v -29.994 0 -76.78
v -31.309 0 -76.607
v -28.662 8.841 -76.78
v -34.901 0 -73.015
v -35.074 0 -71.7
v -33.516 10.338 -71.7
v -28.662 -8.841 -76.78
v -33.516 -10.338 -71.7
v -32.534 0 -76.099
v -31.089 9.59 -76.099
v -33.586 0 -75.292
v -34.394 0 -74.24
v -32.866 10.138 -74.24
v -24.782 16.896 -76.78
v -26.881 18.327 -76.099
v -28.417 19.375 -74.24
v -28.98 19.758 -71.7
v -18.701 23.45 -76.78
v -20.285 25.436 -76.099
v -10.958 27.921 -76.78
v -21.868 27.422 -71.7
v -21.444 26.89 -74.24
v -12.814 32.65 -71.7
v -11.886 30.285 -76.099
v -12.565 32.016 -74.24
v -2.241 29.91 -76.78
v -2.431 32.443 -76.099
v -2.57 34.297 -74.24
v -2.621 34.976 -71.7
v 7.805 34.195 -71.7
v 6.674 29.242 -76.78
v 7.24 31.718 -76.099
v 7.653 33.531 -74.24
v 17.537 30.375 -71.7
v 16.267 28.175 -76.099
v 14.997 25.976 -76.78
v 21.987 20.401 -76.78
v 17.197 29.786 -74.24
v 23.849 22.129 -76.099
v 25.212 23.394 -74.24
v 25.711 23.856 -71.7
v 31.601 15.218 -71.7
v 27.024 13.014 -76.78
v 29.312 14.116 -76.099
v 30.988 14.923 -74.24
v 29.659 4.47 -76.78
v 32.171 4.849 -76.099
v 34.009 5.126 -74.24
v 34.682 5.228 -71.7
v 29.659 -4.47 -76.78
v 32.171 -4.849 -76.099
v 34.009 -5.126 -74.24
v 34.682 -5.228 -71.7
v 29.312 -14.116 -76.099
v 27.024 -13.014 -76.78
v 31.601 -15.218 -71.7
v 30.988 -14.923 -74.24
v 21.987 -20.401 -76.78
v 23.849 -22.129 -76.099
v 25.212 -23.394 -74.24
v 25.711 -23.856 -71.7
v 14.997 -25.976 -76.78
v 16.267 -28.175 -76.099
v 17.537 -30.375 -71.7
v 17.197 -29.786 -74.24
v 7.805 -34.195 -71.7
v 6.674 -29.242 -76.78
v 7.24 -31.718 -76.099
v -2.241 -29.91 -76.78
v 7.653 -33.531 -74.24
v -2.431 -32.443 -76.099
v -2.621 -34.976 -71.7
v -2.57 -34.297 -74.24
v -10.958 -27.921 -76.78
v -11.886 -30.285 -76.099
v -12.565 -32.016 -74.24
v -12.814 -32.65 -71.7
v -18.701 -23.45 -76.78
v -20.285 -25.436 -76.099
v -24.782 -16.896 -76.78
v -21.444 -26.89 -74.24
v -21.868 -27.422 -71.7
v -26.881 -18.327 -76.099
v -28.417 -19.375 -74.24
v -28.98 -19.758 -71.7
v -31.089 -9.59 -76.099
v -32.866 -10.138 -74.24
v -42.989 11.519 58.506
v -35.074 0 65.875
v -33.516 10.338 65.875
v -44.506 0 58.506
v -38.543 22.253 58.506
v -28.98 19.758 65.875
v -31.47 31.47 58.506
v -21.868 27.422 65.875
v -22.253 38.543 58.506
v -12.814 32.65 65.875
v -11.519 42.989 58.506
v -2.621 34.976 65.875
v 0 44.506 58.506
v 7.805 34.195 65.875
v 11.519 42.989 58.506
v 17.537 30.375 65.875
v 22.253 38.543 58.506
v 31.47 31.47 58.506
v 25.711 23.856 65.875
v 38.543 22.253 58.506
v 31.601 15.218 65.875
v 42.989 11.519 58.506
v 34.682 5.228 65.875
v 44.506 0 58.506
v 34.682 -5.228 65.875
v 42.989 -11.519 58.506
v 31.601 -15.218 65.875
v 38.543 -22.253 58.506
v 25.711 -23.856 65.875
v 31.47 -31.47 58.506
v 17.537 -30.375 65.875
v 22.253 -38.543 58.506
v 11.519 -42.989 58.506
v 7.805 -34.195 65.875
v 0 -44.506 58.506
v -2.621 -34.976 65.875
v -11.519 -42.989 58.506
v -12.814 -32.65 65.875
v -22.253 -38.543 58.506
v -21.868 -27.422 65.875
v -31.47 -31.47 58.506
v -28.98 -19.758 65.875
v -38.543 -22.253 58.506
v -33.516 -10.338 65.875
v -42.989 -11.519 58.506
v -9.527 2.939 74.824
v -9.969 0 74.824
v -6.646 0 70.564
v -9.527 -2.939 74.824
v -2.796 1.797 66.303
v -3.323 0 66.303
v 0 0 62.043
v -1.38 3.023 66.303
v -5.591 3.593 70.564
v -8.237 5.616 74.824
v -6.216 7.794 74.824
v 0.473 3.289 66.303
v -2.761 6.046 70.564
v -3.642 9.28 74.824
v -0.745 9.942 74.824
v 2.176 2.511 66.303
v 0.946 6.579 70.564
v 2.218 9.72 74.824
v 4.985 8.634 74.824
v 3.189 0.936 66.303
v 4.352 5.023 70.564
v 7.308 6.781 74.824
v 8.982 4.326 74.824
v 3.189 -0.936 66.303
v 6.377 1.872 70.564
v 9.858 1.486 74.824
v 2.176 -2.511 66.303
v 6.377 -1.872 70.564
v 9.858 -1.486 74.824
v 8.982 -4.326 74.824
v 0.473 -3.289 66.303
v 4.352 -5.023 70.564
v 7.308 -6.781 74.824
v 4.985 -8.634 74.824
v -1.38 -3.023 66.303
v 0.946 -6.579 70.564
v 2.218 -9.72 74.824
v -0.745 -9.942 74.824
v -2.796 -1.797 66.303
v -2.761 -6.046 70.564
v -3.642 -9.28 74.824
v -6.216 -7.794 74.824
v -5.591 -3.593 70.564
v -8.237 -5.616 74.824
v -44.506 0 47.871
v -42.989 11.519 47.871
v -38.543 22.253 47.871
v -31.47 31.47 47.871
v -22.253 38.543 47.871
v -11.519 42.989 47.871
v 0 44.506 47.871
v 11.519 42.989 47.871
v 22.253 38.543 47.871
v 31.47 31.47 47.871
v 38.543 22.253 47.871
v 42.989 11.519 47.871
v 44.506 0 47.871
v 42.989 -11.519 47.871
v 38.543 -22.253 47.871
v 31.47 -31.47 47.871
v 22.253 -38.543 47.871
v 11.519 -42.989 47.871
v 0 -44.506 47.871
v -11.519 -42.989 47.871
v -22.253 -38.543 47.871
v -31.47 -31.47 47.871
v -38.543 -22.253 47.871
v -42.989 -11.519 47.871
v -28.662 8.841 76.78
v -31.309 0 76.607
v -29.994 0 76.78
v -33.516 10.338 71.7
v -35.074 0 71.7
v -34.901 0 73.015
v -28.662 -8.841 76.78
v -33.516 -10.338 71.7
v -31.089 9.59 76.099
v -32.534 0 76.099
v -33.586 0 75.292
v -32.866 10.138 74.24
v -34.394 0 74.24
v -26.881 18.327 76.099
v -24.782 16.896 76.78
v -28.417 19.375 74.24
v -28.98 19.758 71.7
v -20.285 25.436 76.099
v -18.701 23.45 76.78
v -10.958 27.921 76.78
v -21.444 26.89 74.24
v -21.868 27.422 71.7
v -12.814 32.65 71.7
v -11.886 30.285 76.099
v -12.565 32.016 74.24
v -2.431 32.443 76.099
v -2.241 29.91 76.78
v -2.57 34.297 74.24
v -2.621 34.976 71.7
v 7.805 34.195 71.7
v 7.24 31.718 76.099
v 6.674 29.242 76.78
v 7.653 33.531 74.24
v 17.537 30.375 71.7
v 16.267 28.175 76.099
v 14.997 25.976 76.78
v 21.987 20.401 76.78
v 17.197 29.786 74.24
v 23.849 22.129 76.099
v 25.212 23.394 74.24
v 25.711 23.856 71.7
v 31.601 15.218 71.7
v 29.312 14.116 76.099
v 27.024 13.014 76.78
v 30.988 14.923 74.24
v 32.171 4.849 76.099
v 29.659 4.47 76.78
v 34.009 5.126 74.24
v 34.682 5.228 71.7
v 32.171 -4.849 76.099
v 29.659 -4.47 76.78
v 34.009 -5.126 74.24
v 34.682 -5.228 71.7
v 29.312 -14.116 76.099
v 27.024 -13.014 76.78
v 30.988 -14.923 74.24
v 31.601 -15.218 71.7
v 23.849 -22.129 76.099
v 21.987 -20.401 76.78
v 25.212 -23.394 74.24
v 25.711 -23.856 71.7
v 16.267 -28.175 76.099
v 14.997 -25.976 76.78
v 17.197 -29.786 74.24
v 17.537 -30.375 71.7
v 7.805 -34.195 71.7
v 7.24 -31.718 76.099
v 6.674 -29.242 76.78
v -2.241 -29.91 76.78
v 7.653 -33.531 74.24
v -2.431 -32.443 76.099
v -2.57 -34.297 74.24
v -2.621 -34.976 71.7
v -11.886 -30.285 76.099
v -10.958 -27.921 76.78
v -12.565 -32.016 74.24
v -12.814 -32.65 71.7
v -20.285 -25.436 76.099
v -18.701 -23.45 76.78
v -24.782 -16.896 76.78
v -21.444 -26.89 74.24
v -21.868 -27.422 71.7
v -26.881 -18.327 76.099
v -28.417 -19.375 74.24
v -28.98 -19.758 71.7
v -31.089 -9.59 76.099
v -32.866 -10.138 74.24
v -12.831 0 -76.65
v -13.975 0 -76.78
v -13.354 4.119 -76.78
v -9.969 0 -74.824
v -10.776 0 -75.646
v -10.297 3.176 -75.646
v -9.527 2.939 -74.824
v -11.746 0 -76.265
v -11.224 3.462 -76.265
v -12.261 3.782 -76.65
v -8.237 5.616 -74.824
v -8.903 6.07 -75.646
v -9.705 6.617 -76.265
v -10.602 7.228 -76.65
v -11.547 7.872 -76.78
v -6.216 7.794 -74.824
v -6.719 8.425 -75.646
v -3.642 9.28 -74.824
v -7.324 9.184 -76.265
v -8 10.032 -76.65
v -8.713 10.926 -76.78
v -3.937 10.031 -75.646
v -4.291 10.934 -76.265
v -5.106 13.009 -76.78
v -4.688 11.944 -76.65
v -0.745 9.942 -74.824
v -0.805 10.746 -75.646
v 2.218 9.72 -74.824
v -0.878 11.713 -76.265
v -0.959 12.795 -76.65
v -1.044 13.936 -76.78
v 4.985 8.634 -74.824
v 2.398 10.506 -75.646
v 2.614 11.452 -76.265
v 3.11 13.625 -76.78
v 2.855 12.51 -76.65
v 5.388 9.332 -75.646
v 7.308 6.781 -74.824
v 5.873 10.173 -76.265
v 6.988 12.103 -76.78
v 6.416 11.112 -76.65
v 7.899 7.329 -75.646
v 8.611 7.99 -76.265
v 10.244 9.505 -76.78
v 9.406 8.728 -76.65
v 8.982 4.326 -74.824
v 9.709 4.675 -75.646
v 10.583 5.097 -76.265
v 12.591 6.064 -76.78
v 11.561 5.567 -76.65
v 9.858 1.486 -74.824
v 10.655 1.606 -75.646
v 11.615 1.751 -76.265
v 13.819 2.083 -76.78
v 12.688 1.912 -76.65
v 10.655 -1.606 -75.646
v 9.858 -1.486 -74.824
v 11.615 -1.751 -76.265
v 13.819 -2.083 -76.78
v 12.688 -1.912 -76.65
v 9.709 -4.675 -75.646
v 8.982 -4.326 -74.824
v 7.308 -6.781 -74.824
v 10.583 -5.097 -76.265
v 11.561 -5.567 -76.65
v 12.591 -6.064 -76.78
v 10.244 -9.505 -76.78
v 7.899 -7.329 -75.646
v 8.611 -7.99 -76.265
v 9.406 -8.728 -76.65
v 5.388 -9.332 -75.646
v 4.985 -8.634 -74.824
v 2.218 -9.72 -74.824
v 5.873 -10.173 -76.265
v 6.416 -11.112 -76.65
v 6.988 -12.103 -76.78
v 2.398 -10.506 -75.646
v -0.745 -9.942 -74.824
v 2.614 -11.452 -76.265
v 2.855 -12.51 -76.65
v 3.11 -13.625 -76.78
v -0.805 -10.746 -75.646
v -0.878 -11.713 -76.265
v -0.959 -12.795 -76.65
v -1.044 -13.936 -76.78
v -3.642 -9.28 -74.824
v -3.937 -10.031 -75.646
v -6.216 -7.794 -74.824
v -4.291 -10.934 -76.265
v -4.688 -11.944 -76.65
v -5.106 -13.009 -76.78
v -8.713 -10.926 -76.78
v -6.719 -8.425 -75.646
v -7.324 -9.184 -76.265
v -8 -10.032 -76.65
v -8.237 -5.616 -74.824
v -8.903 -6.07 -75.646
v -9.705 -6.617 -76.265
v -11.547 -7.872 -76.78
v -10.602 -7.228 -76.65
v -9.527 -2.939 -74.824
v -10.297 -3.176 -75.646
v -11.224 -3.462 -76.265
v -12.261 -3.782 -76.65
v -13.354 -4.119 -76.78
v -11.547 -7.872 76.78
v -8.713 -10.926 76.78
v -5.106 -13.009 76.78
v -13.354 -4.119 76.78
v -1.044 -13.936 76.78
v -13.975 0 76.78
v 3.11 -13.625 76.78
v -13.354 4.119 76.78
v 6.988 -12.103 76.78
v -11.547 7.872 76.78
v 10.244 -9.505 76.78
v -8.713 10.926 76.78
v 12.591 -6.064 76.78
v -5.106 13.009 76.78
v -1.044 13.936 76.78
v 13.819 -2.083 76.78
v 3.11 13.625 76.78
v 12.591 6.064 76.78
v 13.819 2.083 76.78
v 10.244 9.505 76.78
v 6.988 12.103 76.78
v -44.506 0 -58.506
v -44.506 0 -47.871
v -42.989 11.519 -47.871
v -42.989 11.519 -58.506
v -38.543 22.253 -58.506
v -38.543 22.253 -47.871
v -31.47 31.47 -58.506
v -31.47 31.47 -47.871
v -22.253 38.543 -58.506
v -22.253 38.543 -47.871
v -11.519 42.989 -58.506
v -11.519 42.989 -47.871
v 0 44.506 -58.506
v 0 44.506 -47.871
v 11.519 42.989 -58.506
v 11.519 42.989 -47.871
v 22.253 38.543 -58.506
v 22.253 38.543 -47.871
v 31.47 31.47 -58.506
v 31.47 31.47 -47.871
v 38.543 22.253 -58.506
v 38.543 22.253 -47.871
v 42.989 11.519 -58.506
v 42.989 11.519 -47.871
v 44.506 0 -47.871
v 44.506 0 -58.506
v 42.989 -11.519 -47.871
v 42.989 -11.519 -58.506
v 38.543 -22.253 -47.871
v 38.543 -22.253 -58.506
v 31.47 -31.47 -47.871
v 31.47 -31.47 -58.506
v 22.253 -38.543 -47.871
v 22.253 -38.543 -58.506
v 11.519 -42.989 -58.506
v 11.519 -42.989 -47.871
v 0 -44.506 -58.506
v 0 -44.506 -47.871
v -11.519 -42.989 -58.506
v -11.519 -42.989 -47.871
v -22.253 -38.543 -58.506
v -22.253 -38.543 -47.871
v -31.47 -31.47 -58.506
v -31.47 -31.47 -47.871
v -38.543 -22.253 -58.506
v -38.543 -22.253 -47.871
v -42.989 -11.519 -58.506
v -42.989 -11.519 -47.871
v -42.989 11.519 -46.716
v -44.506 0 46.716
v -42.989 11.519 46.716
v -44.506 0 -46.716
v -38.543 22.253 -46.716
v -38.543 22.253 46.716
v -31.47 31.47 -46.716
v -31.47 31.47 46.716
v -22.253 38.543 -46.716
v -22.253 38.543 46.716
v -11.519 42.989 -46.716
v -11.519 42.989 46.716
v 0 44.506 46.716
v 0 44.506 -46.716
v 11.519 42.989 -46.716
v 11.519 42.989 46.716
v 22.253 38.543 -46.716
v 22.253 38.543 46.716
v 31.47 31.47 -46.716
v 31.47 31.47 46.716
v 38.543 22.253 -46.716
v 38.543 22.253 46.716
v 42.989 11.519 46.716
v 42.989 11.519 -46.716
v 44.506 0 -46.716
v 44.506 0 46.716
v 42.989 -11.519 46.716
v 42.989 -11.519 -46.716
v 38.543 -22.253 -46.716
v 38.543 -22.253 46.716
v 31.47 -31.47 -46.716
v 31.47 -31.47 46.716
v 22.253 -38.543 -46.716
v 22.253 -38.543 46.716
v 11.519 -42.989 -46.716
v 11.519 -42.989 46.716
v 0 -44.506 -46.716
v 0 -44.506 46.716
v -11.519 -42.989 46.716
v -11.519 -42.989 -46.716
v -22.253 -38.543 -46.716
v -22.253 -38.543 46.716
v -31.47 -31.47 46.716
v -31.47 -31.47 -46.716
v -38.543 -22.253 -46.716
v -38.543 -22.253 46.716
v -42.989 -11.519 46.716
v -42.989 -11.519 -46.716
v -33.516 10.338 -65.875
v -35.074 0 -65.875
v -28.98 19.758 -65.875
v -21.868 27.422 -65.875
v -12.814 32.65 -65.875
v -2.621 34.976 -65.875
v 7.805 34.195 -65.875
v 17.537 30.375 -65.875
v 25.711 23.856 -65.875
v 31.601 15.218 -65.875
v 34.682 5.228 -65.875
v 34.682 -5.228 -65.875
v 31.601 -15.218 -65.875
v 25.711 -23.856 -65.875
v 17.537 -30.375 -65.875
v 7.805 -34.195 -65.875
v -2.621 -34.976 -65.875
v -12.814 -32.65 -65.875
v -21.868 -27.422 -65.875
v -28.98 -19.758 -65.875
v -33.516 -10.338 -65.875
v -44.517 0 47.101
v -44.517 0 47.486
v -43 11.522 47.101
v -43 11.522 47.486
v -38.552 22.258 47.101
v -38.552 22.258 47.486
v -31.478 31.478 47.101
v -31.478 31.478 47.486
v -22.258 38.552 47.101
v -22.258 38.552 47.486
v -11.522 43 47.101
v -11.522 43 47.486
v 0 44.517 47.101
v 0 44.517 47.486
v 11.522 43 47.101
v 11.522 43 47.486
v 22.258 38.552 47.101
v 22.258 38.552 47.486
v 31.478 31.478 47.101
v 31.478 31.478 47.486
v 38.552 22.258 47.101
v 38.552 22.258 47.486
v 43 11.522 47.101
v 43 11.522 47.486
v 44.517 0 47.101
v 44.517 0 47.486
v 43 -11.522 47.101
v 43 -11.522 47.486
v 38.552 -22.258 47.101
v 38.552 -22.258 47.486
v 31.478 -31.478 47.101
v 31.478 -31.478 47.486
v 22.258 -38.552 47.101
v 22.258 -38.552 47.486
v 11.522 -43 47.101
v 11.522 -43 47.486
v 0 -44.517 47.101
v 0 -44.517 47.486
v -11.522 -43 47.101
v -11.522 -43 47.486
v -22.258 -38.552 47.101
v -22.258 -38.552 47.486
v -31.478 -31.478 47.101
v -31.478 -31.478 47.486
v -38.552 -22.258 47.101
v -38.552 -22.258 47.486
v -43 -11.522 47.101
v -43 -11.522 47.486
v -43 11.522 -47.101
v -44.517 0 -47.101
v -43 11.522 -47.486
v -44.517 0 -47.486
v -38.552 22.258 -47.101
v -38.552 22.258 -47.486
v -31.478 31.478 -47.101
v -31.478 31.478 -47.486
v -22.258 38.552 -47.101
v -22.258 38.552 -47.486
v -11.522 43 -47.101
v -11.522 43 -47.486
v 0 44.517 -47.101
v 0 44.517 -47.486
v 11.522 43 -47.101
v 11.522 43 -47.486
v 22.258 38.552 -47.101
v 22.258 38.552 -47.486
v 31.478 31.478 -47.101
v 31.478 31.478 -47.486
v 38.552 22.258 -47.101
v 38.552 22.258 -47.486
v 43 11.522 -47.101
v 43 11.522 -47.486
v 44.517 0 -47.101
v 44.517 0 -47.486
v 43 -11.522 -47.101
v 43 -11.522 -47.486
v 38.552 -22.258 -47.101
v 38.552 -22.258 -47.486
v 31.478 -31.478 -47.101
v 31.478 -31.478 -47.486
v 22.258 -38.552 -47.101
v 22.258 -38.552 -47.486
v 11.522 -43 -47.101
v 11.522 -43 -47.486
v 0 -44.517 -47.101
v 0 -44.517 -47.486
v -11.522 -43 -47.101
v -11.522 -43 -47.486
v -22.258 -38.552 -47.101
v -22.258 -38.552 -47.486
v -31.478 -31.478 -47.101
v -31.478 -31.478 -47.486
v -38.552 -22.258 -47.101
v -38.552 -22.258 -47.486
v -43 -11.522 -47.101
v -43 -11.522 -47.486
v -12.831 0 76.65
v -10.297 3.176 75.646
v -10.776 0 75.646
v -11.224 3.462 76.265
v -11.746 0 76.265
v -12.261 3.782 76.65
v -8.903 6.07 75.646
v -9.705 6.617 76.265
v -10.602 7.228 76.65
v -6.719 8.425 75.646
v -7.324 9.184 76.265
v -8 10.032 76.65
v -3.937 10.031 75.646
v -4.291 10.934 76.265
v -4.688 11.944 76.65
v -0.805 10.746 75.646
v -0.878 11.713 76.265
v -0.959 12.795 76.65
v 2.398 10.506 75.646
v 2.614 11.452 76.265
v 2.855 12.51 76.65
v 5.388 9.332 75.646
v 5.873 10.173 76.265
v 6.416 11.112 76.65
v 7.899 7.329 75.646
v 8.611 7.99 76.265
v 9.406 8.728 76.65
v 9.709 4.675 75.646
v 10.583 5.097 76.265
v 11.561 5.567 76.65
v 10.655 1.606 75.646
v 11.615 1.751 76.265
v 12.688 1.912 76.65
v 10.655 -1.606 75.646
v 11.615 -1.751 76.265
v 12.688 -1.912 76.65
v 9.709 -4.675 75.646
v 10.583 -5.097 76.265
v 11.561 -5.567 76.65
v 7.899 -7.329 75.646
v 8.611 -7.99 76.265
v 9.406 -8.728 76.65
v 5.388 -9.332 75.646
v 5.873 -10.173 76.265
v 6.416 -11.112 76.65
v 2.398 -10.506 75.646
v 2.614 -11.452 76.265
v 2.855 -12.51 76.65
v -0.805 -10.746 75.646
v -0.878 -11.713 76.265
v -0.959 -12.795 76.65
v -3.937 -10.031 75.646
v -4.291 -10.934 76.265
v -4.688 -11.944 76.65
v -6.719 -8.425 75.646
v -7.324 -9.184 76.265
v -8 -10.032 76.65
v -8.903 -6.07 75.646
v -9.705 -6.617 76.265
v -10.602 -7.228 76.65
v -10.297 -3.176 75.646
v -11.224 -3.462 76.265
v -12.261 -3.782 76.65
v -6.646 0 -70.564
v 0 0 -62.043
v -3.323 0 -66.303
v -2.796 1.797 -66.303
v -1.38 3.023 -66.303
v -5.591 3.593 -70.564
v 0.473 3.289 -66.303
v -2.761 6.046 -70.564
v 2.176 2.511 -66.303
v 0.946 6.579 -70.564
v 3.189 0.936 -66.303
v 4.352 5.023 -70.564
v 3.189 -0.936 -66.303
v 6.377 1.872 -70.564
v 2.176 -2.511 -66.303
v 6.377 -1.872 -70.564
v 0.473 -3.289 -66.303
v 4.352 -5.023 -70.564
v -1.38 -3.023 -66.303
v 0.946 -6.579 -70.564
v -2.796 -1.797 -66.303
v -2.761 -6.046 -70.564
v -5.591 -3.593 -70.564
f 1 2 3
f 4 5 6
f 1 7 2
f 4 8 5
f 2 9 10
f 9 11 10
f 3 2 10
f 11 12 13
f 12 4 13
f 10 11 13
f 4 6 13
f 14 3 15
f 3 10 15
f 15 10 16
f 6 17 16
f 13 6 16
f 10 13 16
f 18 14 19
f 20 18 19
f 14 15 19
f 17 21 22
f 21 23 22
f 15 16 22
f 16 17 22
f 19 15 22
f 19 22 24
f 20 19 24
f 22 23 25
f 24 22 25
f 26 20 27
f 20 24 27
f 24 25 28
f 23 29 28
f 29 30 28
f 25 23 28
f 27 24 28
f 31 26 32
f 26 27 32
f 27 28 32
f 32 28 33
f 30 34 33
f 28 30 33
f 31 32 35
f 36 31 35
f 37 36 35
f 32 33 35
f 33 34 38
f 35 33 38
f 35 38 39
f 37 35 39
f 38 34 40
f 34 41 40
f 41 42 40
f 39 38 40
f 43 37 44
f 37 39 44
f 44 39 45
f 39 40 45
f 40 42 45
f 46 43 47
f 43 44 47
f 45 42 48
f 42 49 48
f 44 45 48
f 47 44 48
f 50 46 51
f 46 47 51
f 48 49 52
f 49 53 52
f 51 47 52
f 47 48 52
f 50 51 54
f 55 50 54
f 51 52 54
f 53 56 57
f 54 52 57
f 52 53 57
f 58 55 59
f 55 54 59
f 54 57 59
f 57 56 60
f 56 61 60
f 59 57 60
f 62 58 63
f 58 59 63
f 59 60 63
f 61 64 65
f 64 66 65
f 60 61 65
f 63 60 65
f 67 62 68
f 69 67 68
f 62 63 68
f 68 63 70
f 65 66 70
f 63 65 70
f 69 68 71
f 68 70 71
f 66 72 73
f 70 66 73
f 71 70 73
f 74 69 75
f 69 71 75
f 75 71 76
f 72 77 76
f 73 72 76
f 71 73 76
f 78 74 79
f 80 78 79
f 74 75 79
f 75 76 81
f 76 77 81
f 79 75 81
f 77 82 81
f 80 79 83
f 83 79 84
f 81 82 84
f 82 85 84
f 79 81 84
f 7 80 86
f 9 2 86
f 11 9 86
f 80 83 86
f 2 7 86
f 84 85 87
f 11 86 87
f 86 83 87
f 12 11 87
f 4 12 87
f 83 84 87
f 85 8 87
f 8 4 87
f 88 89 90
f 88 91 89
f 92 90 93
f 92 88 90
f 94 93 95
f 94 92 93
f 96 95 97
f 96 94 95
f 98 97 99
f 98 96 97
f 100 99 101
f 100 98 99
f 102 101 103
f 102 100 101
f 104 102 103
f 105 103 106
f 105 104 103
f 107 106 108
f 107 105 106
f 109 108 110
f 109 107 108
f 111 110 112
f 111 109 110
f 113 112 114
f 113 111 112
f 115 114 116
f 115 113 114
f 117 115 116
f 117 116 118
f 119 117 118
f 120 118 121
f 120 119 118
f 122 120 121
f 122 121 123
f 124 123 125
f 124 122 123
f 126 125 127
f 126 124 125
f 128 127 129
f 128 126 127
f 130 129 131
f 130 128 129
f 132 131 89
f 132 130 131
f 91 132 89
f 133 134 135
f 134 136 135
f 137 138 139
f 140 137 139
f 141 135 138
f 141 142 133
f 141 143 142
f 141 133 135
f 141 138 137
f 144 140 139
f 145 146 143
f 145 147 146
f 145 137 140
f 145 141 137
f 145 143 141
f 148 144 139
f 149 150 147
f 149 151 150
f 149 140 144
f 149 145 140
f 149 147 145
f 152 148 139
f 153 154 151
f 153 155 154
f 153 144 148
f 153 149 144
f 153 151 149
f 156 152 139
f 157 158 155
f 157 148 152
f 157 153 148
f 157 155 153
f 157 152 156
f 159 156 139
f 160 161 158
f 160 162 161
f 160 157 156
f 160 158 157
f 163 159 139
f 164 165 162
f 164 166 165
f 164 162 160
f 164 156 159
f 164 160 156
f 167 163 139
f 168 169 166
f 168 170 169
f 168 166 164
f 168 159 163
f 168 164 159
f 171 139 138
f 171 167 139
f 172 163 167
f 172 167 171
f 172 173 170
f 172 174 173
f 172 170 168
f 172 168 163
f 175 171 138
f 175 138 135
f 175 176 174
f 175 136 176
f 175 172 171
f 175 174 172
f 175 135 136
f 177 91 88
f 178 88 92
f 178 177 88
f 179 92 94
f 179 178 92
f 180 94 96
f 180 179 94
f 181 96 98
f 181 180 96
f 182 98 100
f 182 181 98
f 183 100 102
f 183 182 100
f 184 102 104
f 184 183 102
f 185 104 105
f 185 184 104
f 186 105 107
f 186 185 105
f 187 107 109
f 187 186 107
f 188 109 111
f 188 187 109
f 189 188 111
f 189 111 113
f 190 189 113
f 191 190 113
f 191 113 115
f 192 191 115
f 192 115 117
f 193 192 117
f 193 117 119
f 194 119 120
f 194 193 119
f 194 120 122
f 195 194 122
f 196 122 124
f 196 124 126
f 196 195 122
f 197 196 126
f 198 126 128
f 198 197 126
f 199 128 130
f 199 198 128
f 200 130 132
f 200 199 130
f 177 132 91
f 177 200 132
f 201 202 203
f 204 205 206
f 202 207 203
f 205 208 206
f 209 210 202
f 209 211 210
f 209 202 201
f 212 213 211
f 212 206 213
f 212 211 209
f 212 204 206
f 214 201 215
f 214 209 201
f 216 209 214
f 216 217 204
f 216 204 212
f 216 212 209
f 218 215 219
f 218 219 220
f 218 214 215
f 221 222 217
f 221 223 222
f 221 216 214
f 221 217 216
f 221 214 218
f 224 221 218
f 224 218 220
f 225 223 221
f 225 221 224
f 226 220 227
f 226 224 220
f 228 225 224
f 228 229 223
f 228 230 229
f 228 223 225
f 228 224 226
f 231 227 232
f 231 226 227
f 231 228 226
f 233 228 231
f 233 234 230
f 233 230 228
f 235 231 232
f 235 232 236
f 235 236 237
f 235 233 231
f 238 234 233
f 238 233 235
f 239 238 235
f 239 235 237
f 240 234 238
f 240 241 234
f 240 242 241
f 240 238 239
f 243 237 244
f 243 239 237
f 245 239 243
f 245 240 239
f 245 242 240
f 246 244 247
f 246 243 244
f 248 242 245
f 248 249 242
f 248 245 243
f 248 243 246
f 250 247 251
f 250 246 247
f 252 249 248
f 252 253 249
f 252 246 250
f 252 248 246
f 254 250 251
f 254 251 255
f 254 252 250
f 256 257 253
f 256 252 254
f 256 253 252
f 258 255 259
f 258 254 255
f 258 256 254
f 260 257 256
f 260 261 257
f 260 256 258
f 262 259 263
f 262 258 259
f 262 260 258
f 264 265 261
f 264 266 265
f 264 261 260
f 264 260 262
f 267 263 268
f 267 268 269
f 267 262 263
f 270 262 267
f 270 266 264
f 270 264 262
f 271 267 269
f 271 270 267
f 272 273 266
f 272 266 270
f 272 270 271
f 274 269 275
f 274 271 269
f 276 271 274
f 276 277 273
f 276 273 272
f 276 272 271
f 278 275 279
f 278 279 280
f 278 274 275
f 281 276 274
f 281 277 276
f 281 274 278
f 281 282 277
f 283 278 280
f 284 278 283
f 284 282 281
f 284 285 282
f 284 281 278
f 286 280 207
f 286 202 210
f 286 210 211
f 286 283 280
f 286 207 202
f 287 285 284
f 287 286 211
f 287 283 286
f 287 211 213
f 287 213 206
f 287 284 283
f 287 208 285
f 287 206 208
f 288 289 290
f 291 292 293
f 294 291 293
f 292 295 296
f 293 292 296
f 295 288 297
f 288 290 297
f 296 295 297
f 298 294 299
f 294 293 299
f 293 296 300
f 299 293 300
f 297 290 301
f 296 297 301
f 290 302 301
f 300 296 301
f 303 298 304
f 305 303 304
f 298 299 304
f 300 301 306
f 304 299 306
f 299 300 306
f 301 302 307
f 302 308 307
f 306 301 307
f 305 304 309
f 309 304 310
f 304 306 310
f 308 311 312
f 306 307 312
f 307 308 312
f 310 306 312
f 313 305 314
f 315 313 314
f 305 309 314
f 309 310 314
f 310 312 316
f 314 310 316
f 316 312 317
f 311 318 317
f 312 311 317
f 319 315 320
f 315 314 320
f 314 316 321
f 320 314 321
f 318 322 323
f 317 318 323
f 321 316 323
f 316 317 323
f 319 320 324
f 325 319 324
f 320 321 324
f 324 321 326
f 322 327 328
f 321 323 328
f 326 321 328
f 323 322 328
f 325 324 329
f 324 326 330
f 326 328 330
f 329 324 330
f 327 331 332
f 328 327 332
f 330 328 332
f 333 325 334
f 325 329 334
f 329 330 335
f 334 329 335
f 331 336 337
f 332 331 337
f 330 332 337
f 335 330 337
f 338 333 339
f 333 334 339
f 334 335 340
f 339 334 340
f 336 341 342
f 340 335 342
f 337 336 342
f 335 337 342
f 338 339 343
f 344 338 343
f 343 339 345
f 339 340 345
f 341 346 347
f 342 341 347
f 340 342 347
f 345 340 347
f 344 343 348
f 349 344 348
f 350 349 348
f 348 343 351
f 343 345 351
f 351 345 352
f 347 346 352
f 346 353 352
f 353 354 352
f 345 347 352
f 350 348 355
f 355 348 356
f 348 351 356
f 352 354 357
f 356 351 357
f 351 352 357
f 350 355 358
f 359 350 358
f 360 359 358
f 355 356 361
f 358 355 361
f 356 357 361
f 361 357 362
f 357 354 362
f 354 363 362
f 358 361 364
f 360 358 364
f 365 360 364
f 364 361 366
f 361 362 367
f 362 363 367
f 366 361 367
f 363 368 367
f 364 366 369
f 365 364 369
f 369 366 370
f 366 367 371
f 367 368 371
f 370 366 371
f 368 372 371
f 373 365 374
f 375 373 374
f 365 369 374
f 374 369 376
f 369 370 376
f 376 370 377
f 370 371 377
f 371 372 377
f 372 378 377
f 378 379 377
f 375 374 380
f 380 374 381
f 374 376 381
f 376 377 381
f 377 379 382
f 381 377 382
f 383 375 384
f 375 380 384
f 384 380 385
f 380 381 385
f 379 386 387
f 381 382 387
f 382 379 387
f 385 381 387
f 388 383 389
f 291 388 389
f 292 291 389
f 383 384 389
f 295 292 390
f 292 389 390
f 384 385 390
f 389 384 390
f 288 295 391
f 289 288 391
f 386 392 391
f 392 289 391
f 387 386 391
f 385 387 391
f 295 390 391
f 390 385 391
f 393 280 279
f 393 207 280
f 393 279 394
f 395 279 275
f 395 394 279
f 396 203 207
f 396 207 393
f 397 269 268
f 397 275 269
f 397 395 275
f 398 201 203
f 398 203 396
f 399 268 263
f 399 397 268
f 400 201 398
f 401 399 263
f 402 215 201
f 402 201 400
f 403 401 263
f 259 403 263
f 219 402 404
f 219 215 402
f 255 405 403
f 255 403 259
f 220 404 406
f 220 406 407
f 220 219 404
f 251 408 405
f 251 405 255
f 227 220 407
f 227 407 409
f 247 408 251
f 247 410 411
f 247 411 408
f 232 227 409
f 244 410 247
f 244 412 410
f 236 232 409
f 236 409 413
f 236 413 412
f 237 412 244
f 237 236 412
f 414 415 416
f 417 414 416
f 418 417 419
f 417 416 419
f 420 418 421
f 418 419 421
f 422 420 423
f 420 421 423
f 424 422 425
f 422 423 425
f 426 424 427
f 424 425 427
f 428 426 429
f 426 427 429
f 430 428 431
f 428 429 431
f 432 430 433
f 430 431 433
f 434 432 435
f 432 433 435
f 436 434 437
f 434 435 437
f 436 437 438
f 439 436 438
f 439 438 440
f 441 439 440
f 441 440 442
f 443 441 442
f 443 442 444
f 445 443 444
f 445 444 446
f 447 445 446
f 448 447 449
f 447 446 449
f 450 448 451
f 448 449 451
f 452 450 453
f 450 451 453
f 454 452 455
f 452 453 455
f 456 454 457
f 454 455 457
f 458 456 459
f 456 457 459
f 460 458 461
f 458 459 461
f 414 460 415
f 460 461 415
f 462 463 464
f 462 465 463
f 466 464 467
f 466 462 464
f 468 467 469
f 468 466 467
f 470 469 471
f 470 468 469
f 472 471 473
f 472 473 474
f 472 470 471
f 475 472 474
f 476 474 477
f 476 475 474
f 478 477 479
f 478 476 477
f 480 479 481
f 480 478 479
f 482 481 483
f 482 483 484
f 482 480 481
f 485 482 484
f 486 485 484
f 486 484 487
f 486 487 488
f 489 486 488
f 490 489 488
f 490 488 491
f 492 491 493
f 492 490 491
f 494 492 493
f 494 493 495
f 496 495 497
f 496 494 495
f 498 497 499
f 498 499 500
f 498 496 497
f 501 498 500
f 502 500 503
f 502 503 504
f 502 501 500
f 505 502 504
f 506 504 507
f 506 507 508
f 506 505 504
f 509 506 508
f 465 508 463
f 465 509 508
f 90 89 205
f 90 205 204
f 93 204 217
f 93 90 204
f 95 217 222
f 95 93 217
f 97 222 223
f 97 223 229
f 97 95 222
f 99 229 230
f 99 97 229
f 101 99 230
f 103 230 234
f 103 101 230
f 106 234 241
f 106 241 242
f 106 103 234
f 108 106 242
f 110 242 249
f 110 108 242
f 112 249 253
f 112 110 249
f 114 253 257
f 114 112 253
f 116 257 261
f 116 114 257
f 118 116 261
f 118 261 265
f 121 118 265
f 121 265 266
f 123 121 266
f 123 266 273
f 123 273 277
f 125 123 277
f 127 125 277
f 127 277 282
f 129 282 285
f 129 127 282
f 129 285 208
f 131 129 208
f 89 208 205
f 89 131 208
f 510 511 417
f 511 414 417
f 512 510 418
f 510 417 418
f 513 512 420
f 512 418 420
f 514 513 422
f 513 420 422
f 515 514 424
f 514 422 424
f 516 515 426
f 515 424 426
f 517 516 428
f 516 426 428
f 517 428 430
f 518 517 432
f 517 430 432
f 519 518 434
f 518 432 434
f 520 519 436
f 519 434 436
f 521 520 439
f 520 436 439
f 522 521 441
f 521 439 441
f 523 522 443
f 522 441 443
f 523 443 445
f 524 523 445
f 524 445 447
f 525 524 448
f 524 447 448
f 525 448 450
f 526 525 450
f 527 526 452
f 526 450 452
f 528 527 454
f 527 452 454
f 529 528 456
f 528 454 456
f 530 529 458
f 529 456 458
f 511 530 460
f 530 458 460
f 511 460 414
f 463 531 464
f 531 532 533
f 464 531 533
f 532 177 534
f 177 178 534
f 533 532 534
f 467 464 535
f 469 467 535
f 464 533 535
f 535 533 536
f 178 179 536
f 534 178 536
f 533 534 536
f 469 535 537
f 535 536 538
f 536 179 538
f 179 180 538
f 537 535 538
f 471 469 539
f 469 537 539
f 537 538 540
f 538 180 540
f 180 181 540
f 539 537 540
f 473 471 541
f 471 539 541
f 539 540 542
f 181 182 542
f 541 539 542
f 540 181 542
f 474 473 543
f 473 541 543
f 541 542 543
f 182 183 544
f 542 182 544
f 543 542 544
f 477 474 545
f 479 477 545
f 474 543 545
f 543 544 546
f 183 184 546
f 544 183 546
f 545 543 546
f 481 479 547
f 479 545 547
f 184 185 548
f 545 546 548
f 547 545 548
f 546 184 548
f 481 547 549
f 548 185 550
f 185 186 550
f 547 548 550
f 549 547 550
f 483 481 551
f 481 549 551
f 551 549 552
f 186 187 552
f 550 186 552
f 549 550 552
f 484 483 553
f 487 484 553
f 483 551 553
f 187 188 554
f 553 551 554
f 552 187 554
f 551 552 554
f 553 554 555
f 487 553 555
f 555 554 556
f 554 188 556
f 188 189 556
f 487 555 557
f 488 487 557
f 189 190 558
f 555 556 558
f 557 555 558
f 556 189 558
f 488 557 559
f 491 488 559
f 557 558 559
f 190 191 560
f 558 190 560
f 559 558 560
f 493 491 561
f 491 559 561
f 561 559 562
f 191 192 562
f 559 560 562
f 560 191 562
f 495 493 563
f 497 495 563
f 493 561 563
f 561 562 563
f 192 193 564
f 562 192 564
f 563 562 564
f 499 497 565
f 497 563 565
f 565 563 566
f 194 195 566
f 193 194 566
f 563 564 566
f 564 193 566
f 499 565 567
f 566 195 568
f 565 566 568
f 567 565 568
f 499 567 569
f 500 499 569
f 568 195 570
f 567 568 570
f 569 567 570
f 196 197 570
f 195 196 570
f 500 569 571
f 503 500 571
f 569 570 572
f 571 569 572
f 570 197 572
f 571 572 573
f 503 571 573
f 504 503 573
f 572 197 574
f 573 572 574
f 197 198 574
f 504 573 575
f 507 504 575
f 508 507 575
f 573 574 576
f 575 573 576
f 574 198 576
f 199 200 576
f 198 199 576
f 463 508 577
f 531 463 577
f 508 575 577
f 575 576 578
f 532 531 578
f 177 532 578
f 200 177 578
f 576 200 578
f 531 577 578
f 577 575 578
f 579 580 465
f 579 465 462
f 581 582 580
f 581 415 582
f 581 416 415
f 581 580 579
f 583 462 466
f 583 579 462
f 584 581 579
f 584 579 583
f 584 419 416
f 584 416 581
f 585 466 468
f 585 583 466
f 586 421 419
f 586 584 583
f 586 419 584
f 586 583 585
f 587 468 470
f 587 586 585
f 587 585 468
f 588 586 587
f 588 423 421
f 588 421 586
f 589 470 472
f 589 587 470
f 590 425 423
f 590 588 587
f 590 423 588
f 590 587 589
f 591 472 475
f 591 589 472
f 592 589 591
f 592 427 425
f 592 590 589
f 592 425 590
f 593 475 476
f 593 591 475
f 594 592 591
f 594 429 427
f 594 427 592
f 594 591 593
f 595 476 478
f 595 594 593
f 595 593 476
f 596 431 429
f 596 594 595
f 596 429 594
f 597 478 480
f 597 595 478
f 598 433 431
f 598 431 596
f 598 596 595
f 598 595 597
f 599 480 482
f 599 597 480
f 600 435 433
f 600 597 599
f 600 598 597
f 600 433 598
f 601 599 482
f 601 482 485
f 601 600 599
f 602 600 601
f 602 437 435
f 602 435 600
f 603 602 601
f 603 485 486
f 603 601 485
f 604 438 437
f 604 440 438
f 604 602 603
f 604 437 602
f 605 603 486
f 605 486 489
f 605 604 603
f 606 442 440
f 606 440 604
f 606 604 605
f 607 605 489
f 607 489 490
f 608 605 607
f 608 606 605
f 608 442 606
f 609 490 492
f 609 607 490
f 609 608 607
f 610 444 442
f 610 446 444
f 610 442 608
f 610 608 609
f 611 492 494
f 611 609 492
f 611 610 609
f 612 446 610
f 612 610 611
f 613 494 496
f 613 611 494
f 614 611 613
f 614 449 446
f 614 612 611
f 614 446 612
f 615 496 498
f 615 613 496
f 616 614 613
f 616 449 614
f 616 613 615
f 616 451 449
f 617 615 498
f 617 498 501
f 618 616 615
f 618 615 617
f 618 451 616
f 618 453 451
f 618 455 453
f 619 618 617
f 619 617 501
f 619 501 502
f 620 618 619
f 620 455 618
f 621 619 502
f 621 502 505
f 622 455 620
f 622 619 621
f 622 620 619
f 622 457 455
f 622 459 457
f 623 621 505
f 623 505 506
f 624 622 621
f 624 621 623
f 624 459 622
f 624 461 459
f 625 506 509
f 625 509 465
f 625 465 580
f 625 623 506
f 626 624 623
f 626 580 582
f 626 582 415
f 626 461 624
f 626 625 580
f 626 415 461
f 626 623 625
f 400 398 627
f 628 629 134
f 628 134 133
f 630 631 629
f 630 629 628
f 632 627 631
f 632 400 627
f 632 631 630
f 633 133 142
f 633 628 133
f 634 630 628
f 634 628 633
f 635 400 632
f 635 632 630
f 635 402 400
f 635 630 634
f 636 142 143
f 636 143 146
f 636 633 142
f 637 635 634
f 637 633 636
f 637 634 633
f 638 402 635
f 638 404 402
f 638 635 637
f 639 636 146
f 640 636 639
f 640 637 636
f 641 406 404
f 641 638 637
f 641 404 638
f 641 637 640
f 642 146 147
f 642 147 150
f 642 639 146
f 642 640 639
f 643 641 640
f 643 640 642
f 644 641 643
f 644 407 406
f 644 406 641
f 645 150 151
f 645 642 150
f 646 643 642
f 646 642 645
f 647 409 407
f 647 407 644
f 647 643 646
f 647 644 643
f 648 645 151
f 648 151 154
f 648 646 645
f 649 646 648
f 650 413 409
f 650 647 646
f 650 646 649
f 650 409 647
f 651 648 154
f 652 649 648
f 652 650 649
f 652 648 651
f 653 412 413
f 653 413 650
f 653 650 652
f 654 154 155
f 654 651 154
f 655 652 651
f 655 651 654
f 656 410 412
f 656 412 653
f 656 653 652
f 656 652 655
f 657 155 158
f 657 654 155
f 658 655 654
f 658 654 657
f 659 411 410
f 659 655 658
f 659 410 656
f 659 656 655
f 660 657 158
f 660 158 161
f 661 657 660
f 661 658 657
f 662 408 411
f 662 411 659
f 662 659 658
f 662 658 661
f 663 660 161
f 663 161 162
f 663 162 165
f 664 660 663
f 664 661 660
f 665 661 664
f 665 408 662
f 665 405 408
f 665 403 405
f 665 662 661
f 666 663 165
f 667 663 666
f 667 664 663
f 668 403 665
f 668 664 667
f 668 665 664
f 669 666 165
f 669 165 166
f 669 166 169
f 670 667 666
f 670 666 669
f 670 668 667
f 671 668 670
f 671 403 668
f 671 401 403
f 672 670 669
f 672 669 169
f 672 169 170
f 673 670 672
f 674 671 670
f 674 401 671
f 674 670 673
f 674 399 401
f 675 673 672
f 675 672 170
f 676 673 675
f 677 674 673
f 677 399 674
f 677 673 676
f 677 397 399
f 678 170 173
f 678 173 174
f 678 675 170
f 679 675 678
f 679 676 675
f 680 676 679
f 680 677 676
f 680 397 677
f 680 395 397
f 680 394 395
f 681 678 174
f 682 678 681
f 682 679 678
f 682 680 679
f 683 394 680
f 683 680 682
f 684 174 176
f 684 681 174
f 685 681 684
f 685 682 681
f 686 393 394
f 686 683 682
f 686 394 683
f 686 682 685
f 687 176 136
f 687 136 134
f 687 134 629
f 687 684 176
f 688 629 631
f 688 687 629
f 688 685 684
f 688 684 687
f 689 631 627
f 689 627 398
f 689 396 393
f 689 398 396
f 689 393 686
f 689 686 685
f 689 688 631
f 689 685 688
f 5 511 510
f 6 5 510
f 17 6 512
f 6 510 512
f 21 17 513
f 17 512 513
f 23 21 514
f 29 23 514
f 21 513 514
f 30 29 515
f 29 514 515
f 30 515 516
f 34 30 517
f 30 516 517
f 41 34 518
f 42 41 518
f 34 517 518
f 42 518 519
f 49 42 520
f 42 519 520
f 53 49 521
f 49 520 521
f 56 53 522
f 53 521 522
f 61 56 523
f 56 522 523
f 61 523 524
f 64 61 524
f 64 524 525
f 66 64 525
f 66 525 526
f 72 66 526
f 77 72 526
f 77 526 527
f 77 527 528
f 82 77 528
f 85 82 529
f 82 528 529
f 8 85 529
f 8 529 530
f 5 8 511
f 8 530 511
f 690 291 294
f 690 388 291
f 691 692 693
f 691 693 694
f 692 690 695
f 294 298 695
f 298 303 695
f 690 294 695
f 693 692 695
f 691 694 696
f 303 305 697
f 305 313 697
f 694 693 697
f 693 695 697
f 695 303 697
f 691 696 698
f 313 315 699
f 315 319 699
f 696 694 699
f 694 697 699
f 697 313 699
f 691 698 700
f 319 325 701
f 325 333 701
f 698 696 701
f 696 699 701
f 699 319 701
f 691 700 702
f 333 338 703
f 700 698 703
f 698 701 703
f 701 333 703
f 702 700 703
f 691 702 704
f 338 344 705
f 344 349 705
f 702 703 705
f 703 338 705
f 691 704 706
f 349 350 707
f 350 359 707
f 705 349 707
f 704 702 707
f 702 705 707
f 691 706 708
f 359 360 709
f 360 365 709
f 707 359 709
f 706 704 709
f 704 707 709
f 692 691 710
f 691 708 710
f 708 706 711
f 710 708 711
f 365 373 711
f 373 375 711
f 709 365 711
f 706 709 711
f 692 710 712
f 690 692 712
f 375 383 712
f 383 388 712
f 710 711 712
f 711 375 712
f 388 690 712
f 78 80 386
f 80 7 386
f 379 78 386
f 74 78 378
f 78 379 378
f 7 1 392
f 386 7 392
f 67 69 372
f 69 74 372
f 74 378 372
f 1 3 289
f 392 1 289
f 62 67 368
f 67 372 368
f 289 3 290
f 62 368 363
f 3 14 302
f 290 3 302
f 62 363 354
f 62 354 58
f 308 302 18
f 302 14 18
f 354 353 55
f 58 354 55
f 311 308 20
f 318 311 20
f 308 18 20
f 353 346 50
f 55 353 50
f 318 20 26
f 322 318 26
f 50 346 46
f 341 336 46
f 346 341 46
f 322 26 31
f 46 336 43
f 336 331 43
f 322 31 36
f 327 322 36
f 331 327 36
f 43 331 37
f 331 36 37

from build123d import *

# Parameters (mm, degrees)
F2_R = 5.08


with BuildPart() as f1:
    # F0 (on Front) → F1 (revolve)
    with BuildSketch(Plane.XZ):
        with BuildLine():
            Line((0, -61.158732), (0, 62.042959))
            Line((0, 62.042959), (-11.49489, 76.779999))
            Line((-11.49489, 76.779999), (-35.07416, 76.779999))
            Line((-35.07416, 76.779999), (-35.07416, 65.874591))
            Line((-35.07416, 65.874591), (-44.505868, 58.506068))
            Line((-44.505868, 58.506068), (-44.505868, -46.716429))
            ThreePointArc((-44.505868, -46.716429), (-40.659053, -56.89148), (-30.653045, -61.158732))
            Line((-30.653045, -61.158732), (0, -61.158732))
        make_face()
    revolve(axis=Axis((0, 0, 0.442114), (0, 0, -1)))

    # F2
    f2_edges = [f1.edges().sort_by_distance(p)[0] for p in [
        (11.49489, 0, 76.779999),
        (35.07416, 0, 76.779999),
    ]]
    fillet(f2_edges, radius=F2_R)

    # F3: F1 across plane


with BuildPart() as f1_1:
    add(f1.part)
    add(f1.part.mirror(Plane.XY))


solid = f1_1.part
